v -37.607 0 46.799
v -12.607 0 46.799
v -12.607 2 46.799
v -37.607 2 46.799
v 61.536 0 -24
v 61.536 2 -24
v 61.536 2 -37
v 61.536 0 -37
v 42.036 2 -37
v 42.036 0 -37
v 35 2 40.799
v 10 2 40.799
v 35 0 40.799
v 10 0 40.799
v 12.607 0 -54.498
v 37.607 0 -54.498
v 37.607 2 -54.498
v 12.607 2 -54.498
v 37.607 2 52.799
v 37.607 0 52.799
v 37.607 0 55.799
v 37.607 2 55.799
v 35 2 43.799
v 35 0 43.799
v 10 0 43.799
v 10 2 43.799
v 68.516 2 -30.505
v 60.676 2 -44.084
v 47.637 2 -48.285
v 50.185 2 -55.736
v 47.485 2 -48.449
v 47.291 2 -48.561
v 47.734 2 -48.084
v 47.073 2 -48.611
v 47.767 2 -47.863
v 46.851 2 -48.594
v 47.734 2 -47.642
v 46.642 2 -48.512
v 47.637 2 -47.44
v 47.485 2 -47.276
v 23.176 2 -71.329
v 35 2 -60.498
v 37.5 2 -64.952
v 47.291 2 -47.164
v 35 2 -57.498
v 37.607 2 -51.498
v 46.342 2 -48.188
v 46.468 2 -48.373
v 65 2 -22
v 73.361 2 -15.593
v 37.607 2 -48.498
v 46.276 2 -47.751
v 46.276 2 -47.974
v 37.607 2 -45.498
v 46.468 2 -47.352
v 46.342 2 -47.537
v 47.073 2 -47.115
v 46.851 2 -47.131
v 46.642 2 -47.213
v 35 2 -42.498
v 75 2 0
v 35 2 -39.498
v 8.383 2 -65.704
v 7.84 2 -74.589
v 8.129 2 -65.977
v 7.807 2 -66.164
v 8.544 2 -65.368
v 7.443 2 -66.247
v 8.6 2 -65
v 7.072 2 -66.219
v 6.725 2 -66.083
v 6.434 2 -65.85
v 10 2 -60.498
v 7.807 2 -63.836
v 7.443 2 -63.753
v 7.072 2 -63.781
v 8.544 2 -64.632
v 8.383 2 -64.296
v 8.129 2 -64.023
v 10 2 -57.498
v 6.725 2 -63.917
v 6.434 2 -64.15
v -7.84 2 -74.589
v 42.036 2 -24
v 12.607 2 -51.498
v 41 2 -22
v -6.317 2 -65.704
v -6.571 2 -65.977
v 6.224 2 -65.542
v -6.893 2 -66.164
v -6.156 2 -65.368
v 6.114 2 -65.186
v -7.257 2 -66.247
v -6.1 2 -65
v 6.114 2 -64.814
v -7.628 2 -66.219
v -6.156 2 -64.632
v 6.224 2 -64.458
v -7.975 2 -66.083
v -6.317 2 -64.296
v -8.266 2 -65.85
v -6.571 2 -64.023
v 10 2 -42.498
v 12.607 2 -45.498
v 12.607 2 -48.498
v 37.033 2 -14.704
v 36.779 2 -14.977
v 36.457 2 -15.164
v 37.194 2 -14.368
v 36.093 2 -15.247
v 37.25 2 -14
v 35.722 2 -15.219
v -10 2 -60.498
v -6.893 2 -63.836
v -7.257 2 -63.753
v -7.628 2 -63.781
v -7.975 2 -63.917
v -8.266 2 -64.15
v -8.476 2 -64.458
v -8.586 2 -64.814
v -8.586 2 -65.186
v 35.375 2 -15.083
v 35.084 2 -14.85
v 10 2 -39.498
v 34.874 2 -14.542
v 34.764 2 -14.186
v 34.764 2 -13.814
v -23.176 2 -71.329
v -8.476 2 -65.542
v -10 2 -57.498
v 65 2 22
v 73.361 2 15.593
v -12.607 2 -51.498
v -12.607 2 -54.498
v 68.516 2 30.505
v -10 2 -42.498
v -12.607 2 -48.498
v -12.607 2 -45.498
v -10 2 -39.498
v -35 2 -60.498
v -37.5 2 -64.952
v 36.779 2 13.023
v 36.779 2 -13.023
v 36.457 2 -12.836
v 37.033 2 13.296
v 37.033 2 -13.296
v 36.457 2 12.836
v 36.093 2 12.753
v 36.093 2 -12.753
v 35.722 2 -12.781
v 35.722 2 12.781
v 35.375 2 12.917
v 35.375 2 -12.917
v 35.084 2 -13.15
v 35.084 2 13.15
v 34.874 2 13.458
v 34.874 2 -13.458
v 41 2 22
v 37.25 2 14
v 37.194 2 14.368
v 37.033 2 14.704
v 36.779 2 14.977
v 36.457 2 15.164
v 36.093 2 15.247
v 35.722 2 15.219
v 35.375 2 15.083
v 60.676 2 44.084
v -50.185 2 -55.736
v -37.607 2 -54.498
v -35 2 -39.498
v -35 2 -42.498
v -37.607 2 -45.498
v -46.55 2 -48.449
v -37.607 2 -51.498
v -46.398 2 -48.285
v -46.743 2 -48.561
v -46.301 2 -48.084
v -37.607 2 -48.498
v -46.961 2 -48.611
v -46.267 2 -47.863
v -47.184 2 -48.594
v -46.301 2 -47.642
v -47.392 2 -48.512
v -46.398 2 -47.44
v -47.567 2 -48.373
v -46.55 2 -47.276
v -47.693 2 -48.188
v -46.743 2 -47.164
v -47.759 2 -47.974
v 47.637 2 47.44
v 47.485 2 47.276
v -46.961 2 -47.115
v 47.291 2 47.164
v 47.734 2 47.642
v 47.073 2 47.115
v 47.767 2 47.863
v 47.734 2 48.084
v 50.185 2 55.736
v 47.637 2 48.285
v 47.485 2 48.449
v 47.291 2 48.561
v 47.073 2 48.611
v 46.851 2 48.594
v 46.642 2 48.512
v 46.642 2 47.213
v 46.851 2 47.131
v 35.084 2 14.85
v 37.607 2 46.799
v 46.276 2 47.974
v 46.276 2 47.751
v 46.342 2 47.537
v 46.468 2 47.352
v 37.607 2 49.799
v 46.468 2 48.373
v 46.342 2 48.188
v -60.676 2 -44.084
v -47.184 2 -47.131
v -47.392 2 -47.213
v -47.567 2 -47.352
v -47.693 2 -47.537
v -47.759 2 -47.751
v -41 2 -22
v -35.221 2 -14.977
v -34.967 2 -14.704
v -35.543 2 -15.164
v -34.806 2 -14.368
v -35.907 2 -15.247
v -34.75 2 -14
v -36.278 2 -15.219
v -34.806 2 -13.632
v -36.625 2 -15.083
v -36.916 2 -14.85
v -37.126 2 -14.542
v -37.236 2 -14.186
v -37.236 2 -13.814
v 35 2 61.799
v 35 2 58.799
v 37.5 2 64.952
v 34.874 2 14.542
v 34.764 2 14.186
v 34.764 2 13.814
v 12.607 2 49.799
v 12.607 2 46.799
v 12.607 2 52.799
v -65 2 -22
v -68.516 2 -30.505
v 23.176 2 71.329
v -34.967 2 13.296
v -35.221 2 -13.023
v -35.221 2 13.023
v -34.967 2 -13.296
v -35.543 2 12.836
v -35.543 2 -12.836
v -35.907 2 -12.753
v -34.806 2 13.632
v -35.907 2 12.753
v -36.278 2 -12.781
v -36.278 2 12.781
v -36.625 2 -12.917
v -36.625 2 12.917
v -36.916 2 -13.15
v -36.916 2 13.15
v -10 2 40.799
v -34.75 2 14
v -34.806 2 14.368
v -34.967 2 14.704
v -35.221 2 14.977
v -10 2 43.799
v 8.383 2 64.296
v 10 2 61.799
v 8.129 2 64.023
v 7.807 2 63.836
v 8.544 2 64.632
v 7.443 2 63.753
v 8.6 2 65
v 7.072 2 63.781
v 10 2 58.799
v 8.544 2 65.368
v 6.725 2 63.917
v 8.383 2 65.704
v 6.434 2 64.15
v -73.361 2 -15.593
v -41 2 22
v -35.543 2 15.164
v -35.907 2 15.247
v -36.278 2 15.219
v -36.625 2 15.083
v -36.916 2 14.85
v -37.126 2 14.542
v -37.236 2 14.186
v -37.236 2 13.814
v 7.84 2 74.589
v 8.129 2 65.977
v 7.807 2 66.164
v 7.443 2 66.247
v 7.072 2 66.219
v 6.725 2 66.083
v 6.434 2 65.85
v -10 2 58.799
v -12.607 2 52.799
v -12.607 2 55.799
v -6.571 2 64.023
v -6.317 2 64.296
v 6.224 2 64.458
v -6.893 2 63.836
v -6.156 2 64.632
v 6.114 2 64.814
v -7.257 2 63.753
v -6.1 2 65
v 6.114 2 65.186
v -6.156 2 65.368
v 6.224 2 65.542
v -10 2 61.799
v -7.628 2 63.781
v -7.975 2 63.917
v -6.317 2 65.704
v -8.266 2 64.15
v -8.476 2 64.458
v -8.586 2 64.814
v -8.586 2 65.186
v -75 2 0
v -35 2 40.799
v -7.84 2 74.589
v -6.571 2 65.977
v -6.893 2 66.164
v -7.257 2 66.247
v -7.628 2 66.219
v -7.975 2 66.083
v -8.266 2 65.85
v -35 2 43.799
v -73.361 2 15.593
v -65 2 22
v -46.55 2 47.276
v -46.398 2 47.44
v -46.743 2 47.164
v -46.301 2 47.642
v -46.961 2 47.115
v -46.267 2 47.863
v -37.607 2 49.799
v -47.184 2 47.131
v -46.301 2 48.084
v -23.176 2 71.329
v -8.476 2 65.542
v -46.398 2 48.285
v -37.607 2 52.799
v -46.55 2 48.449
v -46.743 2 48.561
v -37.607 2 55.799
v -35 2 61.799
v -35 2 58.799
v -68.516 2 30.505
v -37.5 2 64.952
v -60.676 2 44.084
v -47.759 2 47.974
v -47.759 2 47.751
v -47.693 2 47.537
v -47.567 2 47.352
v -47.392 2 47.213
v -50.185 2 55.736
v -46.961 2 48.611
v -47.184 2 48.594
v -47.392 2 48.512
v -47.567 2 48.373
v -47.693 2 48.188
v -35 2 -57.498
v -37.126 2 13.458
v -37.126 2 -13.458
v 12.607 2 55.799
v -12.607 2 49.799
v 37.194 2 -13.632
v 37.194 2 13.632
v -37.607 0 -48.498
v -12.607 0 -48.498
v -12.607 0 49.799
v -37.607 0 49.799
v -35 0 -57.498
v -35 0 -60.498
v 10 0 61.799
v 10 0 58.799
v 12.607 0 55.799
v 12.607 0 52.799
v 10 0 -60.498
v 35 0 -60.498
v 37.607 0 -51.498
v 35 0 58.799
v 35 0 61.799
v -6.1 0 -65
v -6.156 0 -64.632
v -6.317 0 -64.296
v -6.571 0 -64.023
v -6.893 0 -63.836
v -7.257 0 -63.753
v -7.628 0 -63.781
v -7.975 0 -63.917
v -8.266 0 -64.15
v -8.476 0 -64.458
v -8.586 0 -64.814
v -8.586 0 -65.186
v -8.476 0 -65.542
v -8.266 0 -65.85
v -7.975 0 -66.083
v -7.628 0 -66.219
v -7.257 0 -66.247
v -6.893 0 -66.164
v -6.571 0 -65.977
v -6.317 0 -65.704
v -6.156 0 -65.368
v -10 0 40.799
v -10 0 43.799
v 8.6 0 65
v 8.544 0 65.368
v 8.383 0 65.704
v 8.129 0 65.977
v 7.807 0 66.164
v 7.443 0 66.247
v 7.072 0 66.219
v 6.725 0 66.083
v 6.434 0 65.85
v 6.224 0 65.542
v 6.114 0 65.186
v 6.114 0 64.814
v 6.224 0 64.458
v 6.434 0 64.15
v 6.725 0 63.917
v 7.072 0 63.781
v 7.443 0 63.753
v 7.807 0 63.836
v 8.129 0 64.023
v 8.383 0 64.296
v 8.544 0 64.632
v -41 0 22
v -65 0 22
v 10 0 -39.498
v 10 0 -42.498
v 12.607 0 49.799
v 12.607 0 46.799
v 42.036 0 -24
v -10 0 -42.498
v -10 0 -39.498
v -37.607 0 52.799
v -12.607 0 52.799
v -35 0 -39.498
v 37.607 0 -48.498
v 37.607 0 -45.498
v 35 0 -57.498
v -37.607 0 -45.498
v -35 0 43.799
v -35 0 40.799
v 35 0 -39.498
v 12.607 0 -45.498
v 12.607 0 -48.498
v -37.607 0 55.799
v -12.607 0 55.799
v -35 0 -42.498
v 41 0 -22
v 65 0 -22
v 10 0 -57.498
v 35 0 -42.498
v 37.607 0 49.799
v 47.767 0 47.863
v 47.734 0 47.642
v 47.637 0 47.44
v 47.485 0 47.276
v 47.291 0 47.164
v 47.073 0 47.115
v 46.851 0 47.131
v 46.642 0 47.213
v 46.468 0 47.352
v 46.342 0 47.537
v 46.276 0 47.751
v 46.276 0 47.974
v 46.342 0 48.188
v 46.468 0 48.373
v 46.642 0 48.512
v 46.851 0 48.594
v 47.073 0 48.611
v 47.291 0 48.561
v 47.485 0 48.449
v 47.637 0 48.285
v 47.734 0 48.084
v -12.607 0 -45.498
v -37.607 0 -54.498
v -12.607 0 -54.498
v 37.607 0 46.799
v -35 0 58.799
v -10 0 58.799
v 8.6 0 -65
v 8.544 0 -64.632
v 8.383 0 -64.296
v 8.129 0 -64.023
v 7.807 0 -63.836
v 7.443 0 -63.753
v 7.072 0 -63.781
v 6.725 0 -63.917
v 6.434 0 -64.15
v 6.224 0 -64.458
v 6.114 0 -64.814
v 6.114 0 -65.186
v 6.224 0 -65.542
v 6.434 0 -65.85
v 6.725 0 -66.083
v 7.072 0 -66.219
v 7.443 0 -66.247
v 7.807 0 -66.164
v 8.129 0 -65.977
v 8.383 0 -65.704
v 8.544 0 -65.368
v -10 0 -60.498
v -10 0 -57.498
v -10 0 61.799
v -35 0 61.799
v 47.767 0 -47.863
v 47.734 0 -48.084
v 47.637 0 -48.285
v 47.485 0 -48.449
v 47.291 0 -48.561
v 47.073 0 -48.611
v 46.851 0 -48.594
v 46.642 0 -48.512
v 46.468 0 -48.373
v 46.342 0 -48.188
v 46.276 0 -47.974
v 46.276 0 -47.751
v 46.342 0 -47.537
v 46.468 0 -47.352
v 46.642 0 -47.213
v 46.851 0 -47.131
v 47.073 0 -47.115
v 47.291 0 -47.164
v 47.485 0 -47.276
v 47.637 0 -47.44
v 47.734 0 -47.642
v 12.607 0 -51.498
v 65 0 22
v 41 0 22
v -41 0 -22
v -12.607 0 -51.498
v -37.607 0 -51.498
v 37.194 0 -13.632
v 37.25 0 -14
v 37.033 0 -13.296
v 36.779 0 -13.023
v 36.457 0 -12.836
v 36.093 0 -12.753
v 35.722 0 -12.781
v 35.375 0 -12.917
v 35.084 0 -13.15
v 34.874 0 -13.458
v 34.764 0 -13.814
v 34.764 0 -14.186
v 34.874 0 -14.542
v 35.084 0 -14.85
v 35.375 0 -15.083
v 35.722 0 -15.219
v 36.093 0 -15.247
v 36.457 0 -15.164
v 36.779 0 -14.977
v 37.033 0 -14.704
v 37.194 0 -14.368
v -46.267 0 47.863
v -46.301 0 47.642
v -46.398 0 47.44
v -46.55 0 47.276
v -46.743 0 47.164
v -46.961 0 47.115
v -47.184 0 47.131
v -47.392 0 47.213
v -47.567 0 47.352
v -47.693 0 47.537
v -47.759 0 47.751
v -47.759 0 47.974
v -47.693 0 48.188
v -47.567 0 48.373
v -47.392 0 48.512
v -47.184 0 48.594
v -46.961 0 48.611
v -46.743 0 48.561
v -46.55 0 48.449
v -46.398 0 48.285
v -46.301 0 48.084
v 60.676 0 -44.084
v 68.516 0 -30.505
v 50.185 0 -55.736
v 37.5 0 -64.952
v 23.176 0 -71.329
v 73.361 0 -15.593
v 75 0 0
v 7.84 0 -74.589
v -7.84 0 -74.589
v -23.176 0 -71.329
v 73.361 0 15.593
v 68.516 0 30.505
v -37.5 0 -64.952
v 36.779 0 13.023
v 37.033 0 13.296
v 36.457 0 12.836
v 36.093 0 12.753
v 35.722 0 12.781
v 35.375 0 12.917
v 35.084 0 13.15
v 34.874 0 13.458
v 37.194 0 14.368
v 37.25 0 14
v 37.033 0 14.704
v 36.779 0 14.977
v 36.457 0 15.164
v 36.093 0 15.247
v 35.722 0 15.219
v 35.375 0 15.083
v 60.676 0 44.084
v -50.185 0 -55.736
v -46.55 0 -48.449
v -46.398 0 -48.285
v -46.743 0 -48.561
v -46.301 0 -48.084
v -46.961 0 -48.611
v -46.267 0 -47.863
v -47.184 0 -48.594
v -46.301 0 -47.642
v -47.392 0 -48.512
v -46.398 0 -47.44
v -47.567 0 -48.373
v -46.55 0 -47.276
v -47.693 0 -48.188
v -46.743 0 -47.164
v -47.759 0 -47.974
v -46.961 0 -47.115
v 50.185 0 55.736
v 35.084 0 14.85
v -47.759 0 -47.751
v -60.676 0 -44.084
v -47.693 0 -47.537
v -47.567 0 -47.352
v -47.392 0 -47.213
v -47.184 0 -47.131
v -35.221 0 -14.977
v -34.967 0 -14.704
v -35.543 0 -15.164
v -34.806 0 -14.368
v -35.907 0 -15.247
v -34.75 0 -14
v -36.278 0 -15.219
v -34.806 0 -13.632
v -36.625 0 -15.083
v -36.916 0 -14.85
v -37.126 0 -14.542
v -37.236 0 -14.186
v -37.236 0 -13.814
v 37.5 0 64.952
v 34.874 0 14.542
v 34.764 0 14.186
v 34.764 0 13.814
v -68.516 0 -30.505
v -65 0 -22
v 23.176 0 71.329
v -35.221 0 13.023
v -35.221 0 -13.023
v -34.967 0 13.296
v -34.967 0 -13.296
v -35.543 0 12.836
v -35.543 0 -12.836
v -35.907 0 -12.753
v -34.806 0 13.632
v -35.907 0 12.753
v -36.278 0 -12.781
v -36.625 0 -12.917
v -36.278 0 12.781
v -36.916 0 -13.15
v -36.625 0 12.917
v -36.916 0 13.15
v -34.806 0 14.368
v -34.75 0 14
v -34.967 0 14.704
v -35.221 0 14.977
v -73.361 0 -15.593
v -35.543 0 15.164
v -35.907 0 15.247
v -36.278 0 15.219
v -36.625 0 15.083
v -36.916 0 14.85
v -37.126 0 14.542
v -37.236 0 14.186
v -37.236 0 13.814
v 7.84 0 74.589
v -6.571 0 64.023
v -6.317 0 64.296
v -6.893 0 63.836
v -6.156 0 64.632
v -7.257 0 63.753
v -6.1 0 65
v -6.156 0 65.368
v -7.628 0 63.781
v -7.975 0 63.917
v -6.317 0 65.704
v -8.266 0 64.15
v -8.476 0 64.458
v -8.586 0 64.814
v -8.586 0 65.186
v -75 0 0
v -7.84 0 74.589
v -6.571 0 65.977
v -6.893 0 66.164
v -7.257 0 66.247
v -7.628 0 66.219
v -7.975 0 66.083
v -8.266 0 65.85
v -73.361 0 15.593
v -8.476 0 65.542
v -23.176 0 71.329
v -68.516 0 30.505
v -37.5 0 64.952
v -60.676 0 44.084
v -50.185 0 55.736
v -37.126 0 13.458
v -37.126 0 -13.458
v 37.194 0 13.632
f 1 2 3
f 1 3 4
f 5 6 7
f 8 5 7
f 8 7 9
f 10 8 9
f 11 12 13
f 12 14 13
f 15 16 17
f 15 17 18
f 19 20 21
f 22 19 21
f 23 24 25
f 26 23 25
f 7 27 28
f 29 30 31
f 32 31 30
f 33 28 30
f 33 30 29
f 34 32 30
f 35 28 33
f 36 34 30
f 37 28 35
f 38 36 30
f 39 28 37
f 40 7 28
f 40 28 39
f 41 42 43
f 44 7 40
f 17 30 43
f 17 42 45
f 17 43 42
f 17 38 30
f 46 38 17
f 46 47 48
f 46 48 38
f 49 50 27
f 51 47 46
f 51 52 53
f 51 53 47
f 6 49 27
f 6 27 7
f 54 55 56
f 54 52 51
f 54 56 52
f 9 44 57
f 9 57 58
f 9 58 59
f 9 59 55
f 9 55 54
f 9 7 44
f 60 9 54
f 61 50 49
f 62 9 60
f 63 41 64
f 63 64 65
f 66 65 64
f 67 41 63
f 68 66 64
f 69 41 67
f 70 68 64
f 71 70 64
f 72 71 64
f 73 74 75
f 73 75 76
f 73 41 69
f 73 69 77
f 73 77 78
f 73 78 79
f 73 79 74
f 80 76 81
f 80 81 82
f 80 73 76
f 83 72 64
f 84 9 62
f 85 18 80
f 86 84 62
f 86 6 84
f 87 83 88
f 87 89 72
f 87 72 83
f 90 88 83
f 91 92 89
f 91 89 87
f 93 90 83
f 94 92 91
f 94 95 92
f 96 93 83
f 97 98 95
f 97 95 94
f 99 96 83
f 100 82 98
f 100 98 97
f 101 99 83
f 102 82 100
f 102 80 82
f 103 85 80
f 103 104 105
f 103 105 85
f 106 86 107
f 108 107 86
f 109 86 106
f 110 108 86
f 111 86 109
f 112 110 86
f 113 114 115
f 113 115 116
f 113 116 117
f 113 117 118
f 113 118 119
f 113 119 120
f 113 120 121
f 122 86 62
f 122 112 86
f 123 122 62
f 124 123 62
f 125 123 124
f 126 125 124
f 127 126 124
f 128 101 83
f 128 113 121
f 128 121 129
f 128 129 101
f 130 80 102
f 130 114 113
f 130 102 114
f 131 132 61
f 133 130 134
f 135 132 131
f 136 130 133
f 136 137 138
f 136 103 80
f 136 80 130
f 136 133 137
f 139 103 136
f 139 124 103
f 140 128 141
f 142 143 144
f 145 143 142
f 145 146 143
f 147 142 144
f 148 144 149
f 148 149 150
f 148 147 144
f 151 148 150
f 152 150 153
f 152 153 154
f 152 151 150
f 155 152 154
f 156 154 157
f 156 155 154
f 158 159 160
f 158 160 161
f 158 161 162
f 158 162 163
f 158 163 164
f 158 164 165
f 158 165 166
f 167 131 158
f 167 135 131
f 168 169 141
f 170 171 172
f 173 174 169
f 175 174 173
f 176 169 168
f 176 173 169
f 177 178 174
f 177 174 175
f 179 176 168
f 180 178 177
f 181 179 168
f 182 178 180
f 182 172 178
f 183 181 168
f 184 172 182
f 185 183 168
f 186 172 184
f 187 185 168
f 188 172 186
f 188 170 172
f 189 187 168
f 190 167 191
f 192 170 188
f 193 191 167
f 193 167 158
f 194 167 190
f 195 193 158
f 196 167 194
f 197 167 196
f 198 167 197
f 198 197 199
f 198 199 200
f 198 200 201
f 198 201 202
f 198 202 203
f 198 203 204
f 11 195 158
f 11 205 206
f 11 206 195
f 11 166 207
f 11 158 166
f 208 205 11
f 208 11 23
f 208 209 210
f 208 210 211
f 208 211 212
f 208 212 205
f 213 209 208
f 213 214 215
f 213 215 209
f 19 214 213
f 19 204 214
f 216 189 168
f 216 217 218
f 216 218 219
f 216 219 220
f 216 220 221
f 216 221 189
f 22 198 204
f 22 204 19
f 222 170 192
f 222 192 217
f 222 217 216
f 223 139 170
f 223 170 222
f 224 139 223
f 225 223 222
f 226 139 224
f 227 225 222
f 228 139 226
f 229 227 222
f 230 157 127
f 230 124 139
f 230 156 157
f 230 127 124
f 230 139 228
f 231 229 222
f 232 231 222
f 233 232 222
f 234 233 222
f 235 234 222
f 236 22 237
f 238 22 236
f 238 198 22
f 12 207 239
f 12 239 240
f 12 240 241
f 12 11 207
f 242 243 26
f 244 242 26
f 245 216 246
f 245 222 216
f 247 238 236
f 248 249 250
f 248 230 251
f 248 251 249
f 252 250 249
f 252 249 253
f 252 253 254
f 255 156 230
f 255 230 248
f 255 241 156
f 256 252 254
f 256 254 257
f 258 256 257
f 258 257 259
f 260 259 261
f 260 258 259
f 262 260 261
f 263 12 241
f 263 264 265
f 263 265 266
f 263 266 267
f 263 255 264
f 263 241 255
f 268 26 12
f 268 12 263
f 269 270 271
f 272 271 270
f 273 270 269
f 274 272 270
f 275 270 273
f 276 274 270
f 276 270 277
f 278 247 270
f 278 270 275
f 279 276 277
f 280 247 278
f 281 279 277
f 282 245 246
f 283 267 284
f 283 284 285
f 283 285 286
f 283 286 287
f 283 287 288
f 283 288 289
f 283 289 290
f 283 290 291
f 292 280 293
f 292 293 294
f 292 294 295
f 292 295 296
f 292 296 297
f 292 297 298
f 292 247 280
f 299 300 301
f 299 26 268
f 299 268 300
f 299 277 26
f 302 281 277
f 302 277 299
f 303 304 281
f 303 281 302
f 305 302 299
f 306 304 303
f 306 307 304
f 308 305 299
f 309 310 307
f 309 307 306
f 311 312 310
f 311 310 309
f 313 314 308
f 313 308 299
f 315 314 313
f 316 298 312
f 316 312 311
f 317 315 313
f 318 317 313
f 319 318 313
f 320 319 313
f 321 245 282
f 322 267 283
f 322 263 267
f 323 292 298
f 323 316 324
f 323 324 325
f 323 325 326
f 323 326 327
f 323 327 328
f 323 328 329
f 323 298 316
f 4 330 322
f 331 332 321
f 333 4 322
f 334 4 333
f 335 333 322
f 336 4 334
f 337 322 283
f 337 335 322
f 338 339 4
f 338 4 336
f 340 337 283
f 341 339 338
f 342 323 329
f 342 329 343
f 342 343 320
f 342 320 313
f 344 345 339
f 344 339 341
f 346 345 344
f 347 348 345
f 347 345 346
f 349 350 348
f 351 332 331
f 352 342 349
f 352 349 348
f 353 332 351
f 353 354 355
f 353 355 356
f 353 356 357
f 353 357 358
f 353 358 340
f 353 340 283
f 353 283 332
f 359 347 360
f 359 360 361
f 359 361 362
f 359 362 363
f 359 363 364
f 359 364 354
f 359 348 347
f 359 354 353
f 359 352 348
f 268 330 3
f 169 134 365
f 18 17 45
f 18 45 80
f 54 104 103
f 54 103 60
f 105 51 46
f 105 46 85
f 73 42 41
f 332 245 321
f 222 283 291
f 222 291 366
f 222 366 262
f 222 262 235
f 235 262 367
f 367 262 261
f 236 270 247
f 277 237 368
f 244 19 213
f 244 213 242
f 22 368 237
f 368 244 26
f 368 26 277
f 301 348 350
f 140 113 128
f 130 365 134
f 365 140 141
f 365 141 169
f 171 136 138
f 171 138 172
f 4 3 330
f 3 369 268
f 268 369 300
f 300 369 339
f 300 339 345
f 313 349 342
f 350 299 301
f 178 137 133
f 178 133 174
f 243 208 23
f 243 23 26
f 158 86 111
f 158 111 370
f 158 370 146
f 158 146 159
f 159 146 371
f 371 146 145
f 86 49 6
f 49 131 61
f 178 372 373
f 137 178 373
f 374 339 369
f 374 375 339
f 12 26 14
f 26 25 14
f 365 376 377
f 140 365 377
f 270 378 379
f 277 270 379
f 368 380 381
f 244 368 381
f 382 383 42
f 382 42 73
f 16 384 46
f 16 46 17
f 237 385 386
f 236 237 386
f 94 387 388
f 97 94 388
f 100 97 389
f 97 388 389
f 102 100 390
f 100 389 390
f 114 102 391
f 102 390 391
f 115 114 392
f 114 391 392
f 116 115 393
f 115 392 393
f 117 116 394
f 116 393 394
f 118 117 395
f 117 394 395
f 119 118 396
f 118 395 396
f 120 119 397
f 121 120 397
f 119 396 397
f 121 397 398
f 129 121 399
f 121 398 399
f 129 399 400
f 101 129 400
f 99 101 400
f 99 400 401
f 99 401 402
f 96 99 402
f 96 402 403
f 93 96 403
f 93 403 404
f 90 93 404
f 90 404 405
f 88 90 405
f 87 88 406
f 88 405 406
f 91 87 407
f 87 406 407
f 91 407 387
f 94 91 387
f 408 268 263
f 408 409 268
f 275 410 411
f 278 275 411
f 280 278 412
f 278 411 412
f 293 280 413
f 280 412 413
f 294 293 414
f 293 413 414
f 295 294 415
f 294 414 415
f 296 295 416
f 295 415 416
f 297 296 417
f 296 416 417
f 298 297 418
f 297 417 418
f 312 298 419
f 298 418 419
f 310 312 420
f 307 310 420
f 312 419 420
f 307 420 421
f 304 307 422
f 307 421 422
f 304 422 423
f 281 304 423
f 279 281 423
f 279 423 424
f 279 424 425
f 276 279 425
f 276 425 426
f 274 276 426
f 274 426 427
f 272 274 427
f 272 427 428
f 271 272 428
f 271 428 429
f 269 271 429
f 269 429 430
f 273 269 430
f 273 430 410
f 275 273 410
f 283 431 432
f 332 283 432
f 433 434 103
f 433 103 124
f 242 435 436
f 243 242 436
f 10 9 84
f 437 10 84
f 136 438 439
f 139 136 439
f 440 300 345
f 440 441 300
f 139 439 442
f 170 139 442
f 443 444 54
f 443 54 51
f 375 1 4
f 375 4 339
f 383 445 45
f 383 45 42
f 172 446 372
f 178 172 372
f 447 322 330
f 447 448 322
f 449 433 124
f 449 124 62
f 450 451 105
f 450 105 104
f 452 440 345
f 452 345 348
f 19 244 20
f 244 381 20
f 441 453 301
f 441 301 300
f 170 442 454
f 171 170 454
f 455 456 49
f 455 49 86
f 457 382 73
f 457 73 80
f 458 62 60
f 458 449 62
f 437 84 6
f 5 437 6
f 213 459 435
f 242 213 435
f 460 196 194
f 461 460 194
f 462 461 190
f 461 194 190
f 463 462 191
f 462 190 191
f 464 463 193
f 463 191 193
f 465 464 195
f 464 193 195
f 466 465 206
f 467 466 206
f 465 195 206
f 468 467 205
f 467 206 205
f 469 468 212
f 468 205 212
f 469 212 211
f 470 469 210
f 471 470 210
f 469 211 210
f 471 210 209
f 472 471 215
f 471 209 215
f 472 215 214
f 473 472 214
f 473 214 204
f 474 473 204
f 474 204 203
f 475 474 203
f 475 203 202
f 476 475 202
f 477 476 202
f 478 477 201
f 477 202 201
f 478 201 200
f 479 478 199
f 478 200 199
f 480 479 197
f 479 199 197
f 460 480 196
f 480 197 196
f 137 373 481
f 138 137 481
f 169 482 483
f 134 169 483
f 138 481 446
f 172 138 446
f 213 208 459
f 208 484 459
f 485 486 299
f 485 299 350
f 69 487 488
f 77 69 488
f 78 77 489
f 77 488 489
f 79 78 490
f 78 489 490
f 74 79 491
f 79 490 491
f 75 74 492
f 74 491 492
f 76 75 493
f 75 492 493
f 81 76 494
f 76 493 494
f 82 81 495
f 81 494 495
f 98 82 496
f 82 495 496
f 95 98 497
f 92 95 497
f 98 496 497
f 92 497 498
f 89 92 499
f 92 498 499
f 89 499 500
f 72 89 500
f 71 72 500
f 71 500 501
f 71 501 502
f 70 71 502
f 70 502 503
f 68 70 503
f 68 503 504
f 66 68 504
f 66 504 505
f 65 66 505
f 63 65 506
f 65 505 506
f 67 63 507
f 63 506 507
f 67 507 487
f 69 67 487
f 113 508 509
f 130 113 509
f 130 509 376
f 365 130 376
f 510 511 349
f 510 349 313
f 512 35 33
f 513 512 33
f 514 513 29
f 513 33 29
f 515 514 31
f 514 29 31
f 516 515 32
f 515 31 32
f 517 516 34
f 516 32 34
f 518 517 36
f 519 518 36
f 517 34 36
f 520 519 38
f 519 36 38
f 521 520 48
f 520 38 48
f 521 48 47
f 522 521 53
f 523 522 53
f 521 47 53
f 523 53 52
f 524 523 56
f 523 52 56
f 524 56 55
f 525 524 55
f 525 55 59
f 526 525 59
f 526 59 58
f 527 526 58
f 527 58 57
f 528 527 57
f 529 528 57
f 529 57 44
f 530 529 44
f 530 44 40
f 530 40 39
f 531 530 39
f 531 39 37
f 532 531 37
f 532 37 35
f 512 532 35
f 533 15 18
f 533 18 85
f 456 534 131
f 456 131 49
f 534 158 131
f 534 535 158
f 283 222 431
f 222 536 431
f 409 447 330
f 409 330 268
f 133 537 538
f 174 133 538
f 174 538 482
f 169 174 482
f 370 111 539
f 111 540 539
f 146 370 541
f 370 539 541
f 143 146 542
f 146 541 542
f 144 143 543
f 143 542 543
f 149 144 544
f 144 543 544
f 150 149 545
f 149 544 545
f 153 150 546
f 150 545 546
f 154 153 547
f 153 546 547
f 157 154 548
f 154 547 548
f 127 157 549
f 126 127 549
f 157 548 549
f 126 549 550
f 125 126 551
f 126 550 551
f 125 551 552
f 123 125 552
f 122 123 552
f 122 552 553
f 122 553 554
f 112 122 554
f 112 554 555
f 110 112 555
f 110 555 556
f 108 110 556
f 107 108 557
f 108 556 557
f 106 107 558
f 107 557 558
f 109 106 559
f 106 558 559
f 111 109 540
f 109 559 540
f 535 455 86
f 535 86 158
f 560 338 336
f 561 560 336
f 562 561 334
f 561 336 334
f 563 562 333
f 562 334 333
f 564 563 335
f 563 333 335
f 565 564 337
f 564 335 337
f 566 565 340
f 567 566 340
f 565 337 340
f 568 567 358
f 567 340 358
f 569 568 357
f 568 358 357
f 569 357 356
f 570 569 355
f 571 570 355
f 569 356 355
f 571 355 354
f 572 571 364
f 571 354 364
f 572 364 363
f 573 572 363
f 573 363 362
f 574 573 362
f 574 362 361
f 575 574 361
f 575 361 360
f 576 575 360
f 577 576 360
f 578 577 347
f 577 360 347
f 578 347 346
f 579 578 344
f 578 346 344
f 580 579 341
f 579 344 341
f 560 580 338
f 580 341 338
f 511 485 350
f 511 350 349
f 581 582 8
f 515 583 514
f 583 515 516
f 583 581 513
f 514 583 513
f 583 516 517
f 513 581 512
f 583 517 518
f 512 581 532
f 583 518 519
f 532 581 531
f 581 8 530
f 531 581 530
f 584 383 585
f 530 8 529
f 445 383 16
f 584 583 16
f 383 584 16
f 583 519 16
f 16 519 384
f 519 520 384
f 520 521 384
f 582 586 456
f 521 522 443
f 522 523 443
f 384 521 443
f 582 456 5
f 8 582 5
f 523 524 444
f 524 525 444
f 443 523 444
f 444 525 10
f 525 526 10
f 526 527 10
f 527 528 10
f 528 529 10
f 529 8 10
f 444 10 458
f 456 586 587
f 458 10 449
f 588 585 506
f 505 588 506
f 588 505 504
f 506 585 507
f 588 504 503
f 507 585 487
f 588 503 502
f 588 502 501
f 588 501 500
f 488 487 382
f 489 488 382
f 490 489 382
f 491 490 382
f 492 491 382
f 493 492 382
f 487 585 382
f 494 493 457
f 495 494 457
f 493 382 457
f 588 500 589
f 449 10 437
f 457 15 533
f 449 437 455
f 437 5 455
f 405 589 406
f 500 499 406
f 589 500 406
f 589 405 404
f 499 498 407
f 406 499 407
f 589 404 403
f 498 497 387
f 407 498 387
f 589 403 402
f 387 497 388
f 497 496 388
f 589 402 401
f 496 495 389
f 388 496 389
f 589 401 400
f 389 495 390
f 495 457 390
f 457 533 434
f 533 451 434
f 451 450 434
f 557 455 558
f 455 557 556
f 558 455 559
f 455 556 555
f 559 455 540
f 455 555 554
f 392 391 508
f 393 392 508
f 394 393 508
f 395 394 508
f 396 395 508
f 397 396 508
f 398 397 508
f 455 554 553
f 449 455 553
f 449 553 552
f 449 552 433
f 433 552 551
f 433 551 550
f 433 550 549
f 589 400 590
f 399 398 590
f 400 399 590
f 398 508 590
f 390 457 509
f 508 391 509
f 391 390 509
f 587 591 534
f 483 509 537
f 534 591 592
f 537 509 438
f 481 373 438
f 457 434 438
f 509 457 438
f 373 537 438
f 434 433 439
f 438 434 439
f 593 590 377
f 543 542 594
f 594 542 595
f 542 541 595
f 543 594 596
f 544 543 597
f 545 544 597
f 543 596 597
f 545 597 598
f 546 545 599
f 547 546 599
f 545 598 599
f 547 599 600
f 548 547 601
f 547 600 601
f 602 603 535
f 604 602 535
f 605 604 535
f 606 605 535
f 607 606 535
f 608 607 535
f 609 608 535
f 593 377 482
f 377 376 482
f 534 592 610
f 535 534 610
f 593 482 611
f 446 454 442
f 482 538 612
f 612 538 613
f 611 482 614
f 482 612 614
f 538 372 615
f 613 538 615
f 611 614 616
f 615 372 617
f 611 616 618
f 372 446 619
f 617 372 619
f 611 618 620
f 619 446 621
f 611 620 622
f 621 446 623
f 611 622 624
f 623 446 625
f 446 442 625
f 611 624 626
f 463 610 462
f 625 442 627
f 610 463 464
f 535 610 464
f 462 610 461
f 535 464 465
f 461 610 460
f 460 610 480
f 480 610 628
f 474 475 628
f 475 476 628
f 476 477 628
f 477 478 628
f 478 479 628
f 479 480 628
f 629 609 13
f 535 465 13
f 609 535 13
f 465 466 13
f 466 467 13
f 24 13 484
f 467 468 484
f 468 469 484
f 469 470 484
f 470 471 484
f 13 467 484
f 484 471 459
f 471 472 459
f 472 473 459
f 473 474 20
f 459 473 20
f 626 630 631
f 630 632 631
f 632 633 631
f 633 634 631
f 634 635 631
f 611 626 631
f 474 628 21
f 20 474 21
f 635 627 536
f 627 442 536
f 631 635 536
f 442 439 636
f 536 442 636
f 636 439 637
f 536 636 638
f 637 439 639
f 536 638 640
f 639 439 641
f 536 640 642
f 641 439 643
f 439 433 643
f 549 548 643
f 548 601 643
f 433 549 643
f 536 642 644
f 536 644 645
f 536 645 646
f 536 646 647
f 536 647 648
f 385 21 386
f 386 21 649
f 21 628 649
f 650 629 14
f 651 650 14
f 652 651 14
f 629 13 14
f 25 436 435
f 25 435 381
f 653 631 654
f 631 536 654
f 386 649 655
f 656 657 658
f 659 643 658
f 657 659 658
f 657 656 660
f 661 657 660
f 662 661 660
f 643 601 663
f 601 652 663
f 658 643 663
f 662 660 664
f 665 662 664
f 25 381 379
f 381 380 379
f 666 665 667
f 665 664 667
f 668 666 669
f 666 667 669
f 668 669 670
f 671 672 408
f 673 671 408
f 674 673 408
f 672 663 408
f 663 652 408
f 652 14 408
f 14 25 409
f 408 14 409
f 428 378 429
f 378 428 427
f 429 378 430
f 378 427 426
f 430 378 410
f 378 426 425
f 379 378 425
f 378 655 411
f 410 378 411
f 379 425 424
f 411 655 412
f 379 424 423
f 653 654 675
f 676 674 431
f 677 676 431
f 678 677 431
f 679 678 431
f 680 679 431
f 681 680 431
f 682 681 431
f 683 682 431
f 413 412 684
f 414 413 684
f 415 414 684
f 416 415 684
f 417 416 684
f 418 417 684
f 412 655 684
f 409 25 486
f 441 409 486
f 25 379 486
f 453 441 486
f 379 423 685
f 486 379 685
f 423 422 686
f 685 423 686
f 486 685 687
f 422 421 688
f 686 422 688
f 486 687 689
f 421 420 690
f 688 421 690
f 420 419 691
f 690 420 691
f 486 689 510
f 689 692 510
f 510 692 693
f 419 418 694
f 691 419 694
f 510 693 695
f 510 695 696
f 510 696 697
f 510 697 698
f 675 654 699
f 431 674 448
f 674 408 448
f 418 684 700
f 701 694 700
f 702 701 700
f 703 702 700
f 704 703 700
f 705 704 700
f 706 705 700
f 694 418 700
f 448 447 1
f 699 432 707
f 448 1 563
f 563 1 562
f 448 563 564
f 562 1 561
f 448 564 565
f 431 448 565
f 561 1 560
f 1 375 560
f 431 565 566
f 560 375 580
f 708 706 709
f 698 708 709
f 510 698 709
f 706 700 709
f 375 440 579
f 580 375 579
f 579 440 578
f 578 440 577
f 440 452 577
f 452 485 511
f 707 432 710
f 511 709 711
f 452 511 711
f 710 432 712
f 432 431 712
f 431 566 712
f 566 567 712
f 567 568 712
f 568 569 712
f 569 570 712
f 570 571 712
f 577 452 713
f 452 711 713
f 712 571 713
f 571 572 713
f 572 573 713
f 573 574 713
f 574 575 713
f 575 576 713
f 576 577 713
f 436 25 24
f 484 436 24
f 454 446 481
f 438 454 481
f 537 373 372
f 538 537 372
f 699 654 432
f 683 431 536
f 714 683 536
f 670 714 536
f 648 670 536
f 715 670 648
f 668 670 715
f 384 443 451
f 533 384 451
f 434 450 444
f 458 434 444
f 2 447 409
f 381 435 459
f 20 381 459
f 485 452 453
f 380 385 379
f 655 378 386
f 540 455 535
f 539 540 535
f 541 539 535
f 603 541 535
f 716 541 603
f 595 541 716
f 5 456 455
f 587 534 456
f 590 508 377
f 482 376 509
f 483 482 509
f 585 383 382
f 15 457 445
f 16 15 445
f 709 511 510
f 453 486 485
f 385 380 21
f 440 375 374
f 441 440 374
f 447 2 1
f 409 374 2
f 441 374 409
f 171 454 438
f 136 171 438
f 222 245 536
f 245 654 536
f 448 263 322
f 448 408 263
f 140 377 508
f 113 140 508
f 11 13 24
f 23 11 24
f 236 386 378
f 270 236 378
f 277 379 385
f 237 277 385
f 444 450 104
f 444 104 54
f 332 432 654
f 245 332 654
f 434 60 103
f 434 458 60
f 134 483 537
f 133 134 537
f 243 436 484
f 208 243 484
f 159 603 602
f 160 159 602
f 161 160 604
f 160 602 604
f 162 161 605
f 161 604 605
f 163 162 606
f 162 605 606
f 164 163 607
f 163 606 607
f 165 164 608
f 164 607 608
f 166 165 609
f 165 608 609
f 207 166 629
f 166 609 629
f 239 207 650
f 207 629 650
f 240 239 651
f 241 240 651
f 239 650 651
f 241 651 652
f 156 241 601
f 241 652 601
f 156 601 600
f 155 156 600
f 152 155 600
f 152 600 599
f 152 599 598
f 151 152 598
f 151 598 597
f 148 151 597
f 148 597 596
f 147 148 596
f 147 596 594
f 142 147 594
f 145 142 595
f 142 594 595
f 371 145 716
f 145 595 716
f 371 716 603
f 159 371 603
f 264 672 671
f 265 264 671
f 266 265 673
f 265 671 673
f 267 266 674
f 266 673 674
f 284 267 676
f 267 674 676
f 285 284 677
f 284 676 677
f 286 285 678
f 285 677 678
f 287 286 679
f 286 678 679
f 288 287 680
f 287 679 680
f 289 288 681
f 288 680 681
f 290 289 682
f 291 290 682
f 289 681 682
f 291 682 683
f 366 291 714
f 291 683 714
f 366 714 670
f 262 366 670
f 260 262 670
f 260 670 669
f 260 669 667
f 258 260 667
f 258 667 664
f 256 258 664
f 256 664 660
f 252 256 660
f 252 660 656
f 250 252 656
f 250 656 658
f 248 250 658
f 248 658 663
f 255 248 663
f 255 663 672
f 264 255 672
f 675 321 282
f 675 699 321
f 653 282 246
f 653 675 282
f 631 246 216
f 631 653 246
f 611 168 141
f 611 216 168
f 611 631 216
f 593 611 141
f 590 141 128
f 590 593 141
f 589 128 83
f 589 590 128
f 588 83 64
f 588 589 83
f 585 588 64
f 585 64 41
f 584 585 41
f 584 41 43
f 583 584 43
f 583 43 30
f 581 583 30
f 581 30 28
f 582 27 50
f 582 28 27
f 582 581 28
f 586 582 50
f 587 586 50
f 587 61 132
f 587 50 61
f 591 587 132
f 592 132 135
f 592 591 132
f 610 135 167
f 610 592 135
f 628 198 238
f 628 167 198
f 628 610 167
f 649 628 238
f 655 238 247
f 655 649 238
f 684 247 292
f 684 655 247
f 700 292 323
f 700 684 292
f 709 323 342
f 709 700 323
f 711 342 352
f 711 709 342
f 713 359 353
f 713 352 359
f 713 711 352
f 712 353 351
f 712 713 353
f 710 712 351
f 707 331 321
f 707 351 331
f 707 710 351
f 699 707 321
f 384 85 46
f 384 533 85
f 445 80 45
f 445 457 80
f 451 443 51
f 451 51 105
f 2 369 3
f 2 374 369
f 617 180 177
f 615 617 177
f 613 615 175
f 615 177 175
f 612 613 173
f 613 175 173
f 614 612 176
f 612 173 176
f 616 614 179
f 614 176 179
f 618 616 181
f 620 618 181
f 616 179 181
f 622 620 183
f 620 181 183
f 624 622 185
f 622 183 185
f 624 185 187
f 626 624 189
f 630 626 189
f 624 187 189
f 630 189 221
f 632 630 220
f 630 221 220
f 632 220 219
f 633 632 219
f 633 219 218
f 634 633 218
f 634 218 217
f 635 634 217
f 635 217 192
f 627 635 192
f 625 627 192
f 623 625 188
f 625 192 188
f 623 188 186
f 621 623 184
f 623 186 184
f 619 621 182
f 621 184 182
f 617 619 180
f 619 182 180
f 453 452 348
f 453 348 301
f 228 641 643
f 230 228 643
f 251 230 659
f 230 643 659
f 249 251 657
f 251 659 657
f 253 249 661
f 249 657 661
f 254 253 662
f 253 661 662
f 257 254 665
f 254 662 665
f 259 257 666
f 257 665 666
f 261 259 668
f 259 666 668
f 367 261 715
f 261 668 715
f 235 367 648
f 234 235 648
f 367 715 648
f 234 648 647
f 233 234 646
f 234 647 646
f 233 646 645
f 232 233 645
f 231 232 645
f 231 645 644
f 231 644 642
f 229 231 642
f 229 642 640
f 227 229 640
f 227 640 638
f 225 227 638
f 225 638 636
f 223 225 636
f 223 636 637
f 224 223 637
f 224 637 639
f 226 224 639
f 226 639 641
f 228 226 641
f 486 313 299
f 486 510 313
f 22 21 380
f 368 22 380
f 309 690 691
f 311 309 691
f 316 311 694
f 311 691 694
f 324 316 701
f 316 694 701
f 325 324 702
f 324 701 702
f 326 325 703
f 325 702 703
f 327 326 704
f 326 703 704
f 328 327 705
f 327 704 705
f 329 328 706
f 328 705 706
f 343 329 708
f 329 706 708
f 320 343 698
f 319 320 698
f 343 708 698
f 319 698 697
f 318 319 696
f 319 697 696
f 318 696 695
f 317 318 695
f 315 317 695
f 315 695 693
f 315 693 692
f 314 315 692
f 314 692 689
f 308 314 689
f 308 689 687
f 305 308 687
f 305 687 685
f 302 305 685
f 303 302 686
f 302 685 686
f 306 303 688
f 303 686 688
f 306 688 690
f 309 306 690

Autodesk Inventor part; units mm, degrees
ref_plane "YZ Plane" through (0, 0, 0) normal (1, 0, 0) x (0, 1, 0)
ref_plane "XZ Plane" through (0, 0, 0) normal (0, 1, 0) x (-1, 0, 0)
ref_plane "XY Plane" through (0, 0, 0) normal (0, 0, 1) x (1, 0, 0)
sketch "Boceto1" plane through (0, 0, 0) normal (0, 1, 0) x (-1, 0, 0)
  circle A0 centre (0, 0) radius 75
  line L0 (65, -22) -> (41, -22)
  line L1 (41, -22) -> (41, 22)
  line L2 (41, 22) -> (65, 22)
  line L3 (65, 22) -> (65, -22)
  line L4 (37.6072, -48.4982) -> (12.6072, -48.4982)
  line L5 (12.6072, -48.4982) -> (12.6072, -45.4982)
  line L6 (12.6072, -45.4982) -> (37.6072, -45.4982)
  line L7 (37.6072, -45.4982) -> (37.6072, -48.4982)
  line L8 (37.6072, -54.4982) -> (12.6072, -54.4982)
  line L9 (12.6072, -54.4982) -> (12.6072, -51.4982)
  line L10 (12.6072, -51.4982) -> (37.6072, -51.4982)
  line L11 (37.6072, -51.4982) -> (37.6072, -54.4982)
  line L12 (35, -60.4982) -> (10, -60.4982)
  line L13 (10, -60.4982) -> (10, -57.4982)
  line L14 (10, -57.4982) -> (35, -57.4982)
  line L15 (35, -57.4982) -> (35, -60.4982)
  line L16 (35, -42.4982) -> (10, -42.4982)
  line L17 (10, -42.4982) -> (10, -39.4982)
  line L18 (10, -39.4982) -> (35, -39.4982)
  line L19 (35, -39.4982) -> (35, -42.4982)
  line L20 (-37.6072, -48.4982) -> (-12.6072, -48.4982)
  line L21 (-12.6072, -48.4982) -> (-12.6072, -45.4982)
  line L22 (-12.6072, -45.4982) -> (-37.6072, -45.4982)
  line L23 (-37.6072, -45.4982) -> (-37.6072, -48.4982)
  line L24 (-37.6072, -54.4982) -> (-12.6072, -54.4982)
  line L25 (-37.6072, -51.4982) -> (-37.6072, -54.4982)
  line L26 (-12.6072, -51.4982) -> (-37.6072, -51.4982)
  line L27 (-12.6072, -54.4982) -> (-12.6072, -51.4982)
  line L28 (-35, -60.4982) -> (-10, -60.4982)
  line L29 (-35, -57.4982) -> (-35, -60.4982)
  line L30 (-10, -57.4982) -> (-35, -57.4982)
  line L31 (-10, -60.4982) -> (-10, -57.4982)
  line L32 (-35, -42.4982) -> (-10, -42.4982)
  line L33 (-35, -39.4982) -> (-35, -42.4982)
  line L34 (-10, -39.4982) -> (-35, -39.4982)
  line L35 (-10, -42.4982) -> (-10, -39.4982)
  line L36 (-65, -22) -> (-41, -22)
  line L37 (-41, -22) -> (-41, 22)
  line L38 (-41, 22) -> (-65, 22)
  line L39 (-65, 22) -> (-65, -22)
  line L40 (37.6072, 49.7986) -> (12.6072, 49.7986)
  line L41 (12.6072, 49.7986) -> (12.6072, 46.7986)
  line L42 (12.6072, 46.7986) -> (37.6072, 46.7986)
  line L43 (37.6072, 46.7986) -> (37.6072, 49.7986)
  line L44 (37.6072, 55.7986) -> (12.6072, 55.7986)
  line L45 (37.6072, 52.7986) -> (37.6072, 55.7986)
  line L46 (12.6072, 52.7986) -> (37.6072, 52.7986)
  line L47 (12.6072, 55.7986) -> (12.6072, 52.7986)
  line L48 (35, 61.7986) -> (10, 61.7986)
  line L49 (35, 58.7986) -> (35, 61.7986)
  line L50 (10, 58.7986) -> (35, 58.7986)
  line L51 (10, 61.7986) -> (10, 58.7986)
  line L52 (35, 43.7986) -> (10, 43.7986)
  line L53 (35, 40.7986) -> (35, 43.7986)
  line L54 (10, 40.7986) -> (35, 40.7986)
  line L55 (10, 43.7986) -> (10, 40.7986)
  line L56 (-35, 40.7986) -> (-35, 43.7986)
  line L57 (-10, 43.7986) -> (-10, 40.7986)
  line L58 (-10, 40.7986) -> (-35, 40.7986)
  line L59 (-35, 43.7986) -> (-10, 43.7986)
  line L60 (-12.6072, 49.7986) -> (-12.6072, 46.7986)
  line L61 (-12.6072, 46.7986) -> (-37.6072, 46.7986)
  line L62 (-37.6072, 46.7986) -> (-37.6072, 49.7986)
  line L63 (-37.6072, 49.7986) -> (-12.6072, 49.7986)
  line L64 (-12.6072, 55.7986) -> (-12.6072, 52.7986)
  line L65 (-12.6072, 52.7986) -> (-37.6072, 52.7986)
  line L66 (-37.6072, 55.7986) -> (-12.6072, 55.7986)
  line L67 (-10, 58.7986) -> (-35, 58.7986)
  line L68 (-35, 61.7986) -> (-10, 61.7986)
  line L69 (-10, 61.7986) -> (-10, 58.7986)
  line L70 (-37.6072, 52.7986) -> (-37.6072, 55.7986)
  line L71 (-35, 58.7986) -> (-35, 61.7986)
  point P0 (0, 25.3749)
  dimension "d0" = 150
  dimension "d1" = 24
  dimension "d2" = 44
  dimension "d3" = 10
  dimension "d4" = 25
  dimension "d5" = 3
  dimension "d6" = 25
  dimension "d7" = 3
  dimension "d8" = 25
  dimension "d9" = 3
  dimension "d10" = 25
  dimension "d11" = 3
  dimension "d12" = 3
  dimension "d13" = 3
  dimension "d14" = 3
  dimension "d15" = 0
extrude "Extrusión1" add sketch "Boceto1" along normal blind 2
sketch "Boceto2" plane through (0, 2, 0) normal (0, 1, 0) x (1, 0, 0)
  line L0 (0, 0) -> (0, -9.9603)
  line L1 (0, 0) -> (61.7788, -62.8893)
  circle A0 centre (47.0174, -47.8626) radius 0.75
  arc A1 (50.5529, -44.327) -> (43.5135, -51.4295) centre (47.0174, -47.8626) ccw
  line L2 (-72.438, 0) -> (-75, 0)
  circle A2 centre (0, 0) radius 72.438
  line L3 (44.0781, -44.8705) -> (47.0174, -47.8626)
  line L4 (43.4505, -51.3665) -> (48.0344, -55.9504)
  line L5 (43.4505, -51.3665) -> (49.9332, -51.3665) construction
  line L6 (47.0174, -47.8626) -> (52.0174, -47.8626) construction
  line L7 (50.5529, -44.327) -> (55.1054, -48.8795)
  line L8 (55.1054, -48.8795) -> (48.0344, -55.9504)
  circle A3 centre (-47.0174, -47.8626) radius 0.75
  arc A4 (-43.5135, -51.4295) -> (-50.5529, -44.327) centre (-47.0174, -47.8626) ccw
  line L9 (-44.0781, -44.8705) -> (-47.0174, -47.8626)
  line L10 (-43.4505, -51.3665) -> (-48.0344, -55.9504)
  line L11 (-43.4505, -51.3665) -> (-49.9332, -51.3665) construction
  line L12 (-47.0174, -47.8626) -> (-52.0174, -47.8626) construction
  line L13 (-50.5529, -44.327) -> (-55.1054, -48.8795)
  line L14 (-55.1054, -48.8795) -> (-48.0344, -55.9504)
  line L15 (0, 0) -> (7.916, 0)
  line L16 (-44.0781, 44.8705) -> (-47.0174, 47.8626)
  circle A5 centre (-47.0174, 47.8626) radius 0.75
  line L17 (-43.4505, 51.3665) -> (-49.9332, 51.3665) construction
  arc A6 (-50.5529, 44.327) -> (-43.5135, 51.4295) centre (-47.0174, 47.8626) ccw
  line L18 (-43.4505, 51.3665) -> (-48.0344, 55.9504)
  line L19 (-47.0174, 47.8626) -> (-52.0174, 47.8626) construction
  line L20 (-50.5529, 44.327) -> (-55.1054, 48.8795)
  line L21 (-55.1054, 48.8795) -> (-48.0344, 55.9504)
  line L22 (0, 0) -> (61.7788, 62.8893)
  circle A7 centre (0, 0) radius 72.438
  circle A8 centre (47.0174, 47.8626) radius 0.75
  arc A9 (43.5135, 51.4295) -> (50.5529, 44.327) centre (47.0174, 47.8626) ccw
  line L23 (44.0781, 44.8705) -> (47.0174, 47.8626)
  line L24 (43.4505, 51.3665) -> (48.0344, 55.9504)
  line L25 (47.0174, 47.8626) -> (52.0174, 47.8626) construction
  line L26 (55.1054, 48.8795) -> (48.0344, 55.9504)
  line L27 (50.5529, 44.327) -> (55.1054, 48.8795)
  line L28 (43.4505, 51.3665) -> (49.9332, 51.3665) construction
  dimension "d26" = 1.5
  dimension "d27" = 45
  dimension "d28" = 44.49
  dimension "d29" = 45.51
extrude "Extrusión2" cut sketch "Boceto2" against normal blind 10 contours A0 L1 | L1 A0 | A8 L22 | L22 A8 | A3 | A5
sketch "Boceto3" plane through (0, 0, 0) normal (0, -1, 0) x (1, 0, 0)
  line L0 (0, 0) -> (0, 96.9999)
  line L1 (0, 0) -> (57.8177, 0)
  circle A0 centre (7.35, 65) radius 1.25
  circle A1 centre (-7.35, 65) radius 1.25
  circle A2 centre (7.35, -65) radius 1.25
  circle A3 centre (-7.35, -65) radius 1.25
  dimension "d32" = 2.5
  dimension "d33" = 7.35
  dimension "d34" = 65
extrude "Extrusión3" cut sketch "Boceto3" against normal blind 10
sketch "Boceto4" plane through (0, 0, 0) normal (0, -1, 0) x (1, 0, 0)
  circle A0 centre (-36, 14) radius 1.25
  line L0 (0, 0) -> (0, 13.2611)
  line L1 (0, 0) -> (12.4525, 0)
  circle A1 centre (36, 14) radius 1.25
  circle A2 centre (-36, -14) radius 1.25
  circle A3 centre (36, -14) radius 1.25
  line L2 (-41, 22) -> (-41, -22) projected
  point P0 (0, -13.2611)
  dimension "d37" = 2.5
  dimension "d38" = 14
  dimension "d39" = 5
extrude "Extrusión4" cut sketch "Boceto4" against normal blind 10
sketch "Boceto5" plane through (0, 2, 0) normal (0, 1, 0) x (1, 0, 0)
  line L0 (61.5359, 24) -> (61.5359, 37)
  line L1 (61.5359, 37) -> (42.0359, 37)
  line L2 (42.0359, 37) -> (42.0359, 24)
  line L3 (42.0359, 24) -> (61.5359, 24)
  line L4 (37.6072, 48.4982) -> (37.6072, 45.4982) projected
  line L5 (41, 22) -> (65, 22) projected
  point P0 (0, 0)
  dimension "d46" = 13
  dimension "d47" = 19.5
  dimension "d50" = 2
extrude "Extrusión5" cut sketch "Boceto5" against normal blind 10
sketch "Boceto6" plane through (0, 2, 0) normal (0, 1, 0) x (1, 0, 0)
  circle A0 centre (23, 0) radius 0.75
  circle A1 centre (-23, 0) radius 0.75
  line L0 (-20, 33) -> (20, 33)
  line L1 (20, 33) -> (20, -33)
  line L2 (20, -33) -> (-20, -33)
  line L3 (-20, -33) -> (-20, 33)
  circle A2 centre (-23, 32) radius 0.75
  circle A3 centre (-23, -32) radius 0.75
  circle A4 centre (23, -32) radius 0.75
  circle A5 centre (23, 32) radius 0.75
  line L4 (22, 2.2913) -> (22, 29.7087)
  arc A6 (22, 29.7087) -> (22, 34.2913) centre (23, 32) ccw
  line L5 (22, 34.2913) -> (22, 35)
  line L6 (22, 35) -> (-22, 35)
  line L7 (-22, 35) -> (-22, 34.2913)
  arc A7 (-22, 34.2913) -> (-22, 29.7087) centre (-23, 32) ccw
  line L8 (-22, 29.7087) -> (-22, 2.2913)
  arc A8 (-22, 2.2913) -> (-22, -2.2913) centre (-23, 0) ccw
  line L9 (-22, -2.2913) -> (-22, -29.7087)
  arc A9 (-22, -29.7087) -> (-22, -34.2913) centre (-23, -32) ccw
  line L10 (-22, -34.2913) -> (-22, -35)
  line L11 (-22, -35) -> (22, -35)
  line L12 (22, -35) -> (22, -34.2913)
  arc A10 (22, -34.2913) -> (22, -29.7087) centre (23, -32) ccw
  line L13 (22, -29.7087) -> (22, -2.2913)
  arc A11 (22, -2.2913) -> (22, 2.2913) centre (23, 0) ccw
  line L14 (22, -29.7087) -> (22, -34.2913)
  line L15 (-22, -34.2913) -> (-22, -29.7087)
  line L16 (-22, 29.7087) -> (-22, 34.2913)
  line L17 (22, 34.2913) -> (22, 29.7087)
  line L18 (22, -35) -> (-22, -35)
  line L19 (-22, -35) -> (-22, -37)
  line L20 (-22, -37) -> (22, -37)
  line L21 (22, -37) -> (22, -35)
  line L22 (-22, 35) -> (22, 35)
  line L23 (22, 35) -> (22, 37)
  line L24 (22, 37) -> (-22, 37)
  line L25 (-22, 37) -> (-22, 35)
  point P0 (0, 0)
  point P1 (0, 0)
  dimension "d55" = 70
  dimension "d56" = 2
  dimension "d57" = 44
  dimension "d58" = 2
extrude "Extrusión6" [suppressed]
feature "Engrosado1" [suppressed]
properties part number "Base"
